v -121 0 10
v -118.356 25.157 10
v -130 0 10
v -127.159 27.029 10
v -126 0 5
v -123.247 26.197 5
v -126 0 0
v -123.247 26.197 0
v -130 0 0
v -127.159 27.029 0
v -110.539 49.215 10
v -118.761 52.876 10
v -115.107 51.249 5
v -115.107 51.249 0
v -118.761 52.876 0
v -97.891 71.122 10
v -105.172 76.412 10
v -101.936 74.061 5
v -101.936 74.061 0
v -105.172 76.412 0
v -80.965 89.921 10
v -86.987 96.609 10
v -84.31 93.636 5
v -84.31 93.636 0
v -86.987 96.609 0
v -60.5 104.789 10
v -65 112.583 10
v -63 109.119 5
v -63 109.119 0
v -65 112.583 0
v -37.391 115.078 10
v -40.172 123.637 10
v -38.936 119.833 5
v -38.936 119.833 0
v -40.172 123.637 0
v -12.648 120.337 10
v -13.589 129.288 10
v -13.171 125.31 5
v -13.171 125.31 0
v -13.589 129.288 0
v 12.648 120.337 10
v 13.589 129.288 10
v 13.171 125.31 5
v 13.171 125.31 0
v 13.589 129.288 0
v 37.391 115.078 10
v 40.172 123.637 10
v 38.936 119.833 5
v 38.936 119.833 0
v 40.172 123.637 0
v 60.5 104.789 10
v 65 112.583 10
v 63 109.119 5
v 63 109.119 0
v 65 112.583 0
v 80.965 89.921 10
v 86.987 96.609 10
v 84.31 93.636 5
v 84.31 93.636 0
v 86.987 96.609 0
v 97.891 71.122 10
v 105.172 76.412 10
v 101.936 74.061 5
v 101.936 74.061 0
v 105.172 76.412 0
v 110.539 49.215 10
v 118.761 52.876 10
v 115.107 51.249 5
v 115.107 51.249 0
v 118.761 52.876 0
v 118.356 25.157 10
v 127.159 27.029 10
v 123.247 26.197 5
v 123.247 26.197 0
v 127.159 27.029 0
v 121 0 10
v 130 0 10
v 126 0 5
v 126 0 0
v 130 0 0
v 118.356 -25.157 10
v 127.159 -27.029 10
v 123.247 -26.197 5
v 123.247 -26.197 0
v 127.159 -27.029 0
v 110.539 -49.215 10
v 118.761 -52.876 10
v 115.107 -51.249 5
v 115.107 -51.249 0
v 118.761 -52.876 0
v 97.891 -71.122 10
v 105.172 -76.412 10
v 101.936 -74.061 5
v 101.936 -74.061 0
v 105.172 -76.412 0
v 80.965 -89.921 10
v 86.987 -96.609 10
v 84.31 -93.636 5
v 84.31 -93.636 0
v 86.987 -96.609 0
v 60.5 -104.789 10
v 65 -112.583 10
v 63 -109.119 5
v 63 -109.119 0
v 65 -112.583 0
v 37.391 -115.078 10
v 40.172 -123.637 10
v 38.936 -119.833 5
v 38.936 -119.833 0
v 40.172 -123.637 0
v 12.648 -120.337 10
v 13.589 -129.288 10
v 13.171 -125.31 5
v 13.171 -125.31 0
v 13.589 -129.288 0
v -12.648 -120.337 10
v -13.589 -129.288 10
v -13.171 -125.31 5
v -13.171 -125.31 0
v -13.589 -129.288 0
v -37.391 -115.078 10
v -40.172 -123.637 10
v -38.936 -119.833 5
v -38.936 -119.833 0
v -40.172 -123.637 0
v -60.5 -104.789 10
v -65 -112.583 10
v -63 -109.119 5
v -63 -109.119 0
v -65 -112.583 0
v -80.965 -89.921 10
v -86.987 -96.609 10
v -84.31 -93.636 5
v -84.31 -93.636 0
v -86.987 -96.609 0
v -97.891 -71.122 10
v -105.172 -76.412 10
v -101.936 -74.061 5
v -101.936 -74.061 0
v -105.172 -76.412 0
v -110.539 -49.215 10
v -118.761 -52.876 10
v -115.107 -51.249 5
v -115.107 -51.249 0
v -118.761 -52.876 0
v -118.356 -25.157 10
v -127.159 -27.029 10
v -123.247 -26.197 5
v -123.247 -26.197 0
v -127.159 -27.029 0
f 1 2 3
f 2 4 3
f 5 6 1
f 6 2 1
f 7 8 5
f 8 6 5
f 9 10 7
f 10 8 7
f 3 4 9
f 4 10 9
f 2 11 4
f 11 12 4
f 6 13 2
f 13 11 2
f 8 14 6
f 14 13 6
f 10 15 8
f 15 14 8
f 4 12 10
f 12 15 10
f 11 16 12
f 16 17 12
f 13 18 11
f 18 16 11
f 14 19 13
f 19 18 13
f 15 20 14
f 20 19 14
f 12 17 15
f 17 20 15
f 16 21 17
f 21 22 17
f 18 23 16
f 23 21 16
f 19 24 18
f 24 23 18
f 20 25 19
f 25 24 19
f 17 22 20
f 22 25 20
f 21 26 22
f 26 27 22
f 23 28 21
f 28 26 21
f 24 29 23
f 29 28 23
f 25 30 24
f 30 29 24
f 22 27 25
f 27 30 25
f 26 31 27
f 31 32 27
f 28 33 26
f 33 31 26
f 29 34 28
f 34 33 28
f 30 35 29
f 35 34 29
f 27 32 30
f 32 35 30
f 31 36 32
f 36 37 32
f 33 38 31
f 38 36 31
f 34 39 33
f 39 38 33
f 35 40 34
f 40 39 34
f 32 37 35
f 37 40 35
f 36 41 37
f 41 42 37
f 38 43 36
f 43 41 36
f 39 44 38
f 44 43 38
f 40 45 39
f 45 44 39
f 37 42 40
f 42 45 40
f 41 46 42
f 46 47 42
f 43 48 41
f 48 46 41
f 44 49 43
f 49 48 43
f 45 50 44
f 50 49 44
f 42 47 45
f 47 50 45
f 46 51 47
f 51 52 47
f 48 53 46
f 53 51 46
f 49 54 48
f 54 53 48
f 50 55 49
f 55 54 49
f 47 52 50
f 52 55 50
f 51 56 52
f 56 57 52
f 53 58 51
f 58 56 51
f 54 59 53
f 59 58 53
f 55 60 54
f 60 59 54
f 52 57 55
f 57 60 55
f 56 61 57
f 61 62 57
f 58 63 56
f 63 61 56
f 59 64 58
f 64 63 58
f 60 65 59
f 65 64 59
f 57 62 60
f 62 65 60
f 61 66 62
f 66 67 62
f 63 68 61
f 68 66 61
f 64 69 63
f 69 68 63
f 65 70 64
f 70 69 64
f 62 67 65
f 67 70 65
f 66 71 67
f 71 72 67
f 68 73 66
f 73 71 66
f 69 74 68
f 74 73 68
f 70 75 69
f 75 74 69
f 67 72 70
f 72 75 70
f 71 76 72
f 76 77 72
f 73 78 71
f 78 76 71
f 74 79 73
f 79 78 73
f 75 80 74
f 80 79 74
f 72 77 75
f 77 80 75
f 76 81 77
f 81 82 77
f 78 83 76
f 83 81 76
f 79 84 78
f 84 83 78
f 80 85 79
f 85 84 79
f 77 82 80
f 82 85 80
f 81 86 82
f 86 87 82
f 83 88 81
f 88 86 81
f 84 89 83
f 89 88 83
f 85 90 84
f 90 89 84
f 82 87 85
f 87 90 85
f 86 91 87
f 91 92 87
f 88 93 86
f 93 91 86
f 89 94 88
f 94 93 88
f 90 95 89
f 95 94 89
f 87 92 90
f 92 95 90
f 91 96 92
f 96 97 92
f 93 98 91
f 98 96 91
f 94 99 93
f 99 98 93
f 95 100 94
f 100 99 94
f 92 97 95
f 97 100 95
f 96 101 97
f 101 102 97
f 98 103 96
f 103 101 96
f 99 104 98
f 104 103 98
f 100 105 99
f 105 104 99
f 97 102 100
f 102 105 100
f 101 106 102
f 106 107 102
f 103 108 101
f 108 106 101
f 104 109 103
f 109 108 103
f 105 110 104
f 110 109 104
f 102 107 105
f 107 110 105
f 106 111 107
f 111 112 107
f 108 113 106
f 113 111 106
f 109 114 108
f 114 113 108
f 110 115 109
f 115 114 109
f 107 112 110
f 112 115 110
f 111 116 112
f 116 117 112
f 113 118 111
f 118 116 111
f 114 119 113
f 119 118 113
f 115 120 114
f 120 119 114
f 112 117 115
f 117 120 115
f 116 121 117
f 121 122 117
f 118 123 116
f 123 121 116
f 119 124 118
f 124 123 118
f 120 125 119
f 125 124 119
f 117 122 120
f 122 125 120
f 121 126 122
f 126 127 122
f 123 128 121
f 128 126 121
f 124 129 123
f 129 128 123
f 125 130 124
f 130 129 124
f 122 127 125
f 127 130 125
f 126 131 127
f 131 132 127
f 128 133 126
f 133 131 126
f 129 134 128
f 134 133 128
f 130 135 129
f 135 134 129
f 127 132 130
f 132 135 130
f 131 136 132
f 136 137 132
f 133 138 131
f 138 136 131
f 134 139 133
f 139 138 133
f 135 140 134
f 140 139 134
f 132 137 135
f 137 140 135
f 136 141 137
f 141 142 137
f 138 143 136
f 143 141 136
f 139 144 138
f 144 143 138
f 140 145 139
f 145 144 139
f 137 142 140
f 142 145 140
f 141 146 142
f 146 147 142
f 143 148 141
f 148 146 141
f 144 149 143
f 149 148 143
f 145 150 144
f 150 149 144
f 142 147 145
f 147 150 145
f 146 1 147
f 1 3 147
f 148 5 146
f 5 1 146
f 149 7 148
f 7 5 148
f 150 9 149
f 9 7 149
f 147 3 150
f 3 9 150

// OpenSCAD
module retaining_ring() {
    rotate_extrude()
        polygon( points=[[130,0],[130,10],[121,10],[126,5],[126,0]]);
}

retaining_ring();
